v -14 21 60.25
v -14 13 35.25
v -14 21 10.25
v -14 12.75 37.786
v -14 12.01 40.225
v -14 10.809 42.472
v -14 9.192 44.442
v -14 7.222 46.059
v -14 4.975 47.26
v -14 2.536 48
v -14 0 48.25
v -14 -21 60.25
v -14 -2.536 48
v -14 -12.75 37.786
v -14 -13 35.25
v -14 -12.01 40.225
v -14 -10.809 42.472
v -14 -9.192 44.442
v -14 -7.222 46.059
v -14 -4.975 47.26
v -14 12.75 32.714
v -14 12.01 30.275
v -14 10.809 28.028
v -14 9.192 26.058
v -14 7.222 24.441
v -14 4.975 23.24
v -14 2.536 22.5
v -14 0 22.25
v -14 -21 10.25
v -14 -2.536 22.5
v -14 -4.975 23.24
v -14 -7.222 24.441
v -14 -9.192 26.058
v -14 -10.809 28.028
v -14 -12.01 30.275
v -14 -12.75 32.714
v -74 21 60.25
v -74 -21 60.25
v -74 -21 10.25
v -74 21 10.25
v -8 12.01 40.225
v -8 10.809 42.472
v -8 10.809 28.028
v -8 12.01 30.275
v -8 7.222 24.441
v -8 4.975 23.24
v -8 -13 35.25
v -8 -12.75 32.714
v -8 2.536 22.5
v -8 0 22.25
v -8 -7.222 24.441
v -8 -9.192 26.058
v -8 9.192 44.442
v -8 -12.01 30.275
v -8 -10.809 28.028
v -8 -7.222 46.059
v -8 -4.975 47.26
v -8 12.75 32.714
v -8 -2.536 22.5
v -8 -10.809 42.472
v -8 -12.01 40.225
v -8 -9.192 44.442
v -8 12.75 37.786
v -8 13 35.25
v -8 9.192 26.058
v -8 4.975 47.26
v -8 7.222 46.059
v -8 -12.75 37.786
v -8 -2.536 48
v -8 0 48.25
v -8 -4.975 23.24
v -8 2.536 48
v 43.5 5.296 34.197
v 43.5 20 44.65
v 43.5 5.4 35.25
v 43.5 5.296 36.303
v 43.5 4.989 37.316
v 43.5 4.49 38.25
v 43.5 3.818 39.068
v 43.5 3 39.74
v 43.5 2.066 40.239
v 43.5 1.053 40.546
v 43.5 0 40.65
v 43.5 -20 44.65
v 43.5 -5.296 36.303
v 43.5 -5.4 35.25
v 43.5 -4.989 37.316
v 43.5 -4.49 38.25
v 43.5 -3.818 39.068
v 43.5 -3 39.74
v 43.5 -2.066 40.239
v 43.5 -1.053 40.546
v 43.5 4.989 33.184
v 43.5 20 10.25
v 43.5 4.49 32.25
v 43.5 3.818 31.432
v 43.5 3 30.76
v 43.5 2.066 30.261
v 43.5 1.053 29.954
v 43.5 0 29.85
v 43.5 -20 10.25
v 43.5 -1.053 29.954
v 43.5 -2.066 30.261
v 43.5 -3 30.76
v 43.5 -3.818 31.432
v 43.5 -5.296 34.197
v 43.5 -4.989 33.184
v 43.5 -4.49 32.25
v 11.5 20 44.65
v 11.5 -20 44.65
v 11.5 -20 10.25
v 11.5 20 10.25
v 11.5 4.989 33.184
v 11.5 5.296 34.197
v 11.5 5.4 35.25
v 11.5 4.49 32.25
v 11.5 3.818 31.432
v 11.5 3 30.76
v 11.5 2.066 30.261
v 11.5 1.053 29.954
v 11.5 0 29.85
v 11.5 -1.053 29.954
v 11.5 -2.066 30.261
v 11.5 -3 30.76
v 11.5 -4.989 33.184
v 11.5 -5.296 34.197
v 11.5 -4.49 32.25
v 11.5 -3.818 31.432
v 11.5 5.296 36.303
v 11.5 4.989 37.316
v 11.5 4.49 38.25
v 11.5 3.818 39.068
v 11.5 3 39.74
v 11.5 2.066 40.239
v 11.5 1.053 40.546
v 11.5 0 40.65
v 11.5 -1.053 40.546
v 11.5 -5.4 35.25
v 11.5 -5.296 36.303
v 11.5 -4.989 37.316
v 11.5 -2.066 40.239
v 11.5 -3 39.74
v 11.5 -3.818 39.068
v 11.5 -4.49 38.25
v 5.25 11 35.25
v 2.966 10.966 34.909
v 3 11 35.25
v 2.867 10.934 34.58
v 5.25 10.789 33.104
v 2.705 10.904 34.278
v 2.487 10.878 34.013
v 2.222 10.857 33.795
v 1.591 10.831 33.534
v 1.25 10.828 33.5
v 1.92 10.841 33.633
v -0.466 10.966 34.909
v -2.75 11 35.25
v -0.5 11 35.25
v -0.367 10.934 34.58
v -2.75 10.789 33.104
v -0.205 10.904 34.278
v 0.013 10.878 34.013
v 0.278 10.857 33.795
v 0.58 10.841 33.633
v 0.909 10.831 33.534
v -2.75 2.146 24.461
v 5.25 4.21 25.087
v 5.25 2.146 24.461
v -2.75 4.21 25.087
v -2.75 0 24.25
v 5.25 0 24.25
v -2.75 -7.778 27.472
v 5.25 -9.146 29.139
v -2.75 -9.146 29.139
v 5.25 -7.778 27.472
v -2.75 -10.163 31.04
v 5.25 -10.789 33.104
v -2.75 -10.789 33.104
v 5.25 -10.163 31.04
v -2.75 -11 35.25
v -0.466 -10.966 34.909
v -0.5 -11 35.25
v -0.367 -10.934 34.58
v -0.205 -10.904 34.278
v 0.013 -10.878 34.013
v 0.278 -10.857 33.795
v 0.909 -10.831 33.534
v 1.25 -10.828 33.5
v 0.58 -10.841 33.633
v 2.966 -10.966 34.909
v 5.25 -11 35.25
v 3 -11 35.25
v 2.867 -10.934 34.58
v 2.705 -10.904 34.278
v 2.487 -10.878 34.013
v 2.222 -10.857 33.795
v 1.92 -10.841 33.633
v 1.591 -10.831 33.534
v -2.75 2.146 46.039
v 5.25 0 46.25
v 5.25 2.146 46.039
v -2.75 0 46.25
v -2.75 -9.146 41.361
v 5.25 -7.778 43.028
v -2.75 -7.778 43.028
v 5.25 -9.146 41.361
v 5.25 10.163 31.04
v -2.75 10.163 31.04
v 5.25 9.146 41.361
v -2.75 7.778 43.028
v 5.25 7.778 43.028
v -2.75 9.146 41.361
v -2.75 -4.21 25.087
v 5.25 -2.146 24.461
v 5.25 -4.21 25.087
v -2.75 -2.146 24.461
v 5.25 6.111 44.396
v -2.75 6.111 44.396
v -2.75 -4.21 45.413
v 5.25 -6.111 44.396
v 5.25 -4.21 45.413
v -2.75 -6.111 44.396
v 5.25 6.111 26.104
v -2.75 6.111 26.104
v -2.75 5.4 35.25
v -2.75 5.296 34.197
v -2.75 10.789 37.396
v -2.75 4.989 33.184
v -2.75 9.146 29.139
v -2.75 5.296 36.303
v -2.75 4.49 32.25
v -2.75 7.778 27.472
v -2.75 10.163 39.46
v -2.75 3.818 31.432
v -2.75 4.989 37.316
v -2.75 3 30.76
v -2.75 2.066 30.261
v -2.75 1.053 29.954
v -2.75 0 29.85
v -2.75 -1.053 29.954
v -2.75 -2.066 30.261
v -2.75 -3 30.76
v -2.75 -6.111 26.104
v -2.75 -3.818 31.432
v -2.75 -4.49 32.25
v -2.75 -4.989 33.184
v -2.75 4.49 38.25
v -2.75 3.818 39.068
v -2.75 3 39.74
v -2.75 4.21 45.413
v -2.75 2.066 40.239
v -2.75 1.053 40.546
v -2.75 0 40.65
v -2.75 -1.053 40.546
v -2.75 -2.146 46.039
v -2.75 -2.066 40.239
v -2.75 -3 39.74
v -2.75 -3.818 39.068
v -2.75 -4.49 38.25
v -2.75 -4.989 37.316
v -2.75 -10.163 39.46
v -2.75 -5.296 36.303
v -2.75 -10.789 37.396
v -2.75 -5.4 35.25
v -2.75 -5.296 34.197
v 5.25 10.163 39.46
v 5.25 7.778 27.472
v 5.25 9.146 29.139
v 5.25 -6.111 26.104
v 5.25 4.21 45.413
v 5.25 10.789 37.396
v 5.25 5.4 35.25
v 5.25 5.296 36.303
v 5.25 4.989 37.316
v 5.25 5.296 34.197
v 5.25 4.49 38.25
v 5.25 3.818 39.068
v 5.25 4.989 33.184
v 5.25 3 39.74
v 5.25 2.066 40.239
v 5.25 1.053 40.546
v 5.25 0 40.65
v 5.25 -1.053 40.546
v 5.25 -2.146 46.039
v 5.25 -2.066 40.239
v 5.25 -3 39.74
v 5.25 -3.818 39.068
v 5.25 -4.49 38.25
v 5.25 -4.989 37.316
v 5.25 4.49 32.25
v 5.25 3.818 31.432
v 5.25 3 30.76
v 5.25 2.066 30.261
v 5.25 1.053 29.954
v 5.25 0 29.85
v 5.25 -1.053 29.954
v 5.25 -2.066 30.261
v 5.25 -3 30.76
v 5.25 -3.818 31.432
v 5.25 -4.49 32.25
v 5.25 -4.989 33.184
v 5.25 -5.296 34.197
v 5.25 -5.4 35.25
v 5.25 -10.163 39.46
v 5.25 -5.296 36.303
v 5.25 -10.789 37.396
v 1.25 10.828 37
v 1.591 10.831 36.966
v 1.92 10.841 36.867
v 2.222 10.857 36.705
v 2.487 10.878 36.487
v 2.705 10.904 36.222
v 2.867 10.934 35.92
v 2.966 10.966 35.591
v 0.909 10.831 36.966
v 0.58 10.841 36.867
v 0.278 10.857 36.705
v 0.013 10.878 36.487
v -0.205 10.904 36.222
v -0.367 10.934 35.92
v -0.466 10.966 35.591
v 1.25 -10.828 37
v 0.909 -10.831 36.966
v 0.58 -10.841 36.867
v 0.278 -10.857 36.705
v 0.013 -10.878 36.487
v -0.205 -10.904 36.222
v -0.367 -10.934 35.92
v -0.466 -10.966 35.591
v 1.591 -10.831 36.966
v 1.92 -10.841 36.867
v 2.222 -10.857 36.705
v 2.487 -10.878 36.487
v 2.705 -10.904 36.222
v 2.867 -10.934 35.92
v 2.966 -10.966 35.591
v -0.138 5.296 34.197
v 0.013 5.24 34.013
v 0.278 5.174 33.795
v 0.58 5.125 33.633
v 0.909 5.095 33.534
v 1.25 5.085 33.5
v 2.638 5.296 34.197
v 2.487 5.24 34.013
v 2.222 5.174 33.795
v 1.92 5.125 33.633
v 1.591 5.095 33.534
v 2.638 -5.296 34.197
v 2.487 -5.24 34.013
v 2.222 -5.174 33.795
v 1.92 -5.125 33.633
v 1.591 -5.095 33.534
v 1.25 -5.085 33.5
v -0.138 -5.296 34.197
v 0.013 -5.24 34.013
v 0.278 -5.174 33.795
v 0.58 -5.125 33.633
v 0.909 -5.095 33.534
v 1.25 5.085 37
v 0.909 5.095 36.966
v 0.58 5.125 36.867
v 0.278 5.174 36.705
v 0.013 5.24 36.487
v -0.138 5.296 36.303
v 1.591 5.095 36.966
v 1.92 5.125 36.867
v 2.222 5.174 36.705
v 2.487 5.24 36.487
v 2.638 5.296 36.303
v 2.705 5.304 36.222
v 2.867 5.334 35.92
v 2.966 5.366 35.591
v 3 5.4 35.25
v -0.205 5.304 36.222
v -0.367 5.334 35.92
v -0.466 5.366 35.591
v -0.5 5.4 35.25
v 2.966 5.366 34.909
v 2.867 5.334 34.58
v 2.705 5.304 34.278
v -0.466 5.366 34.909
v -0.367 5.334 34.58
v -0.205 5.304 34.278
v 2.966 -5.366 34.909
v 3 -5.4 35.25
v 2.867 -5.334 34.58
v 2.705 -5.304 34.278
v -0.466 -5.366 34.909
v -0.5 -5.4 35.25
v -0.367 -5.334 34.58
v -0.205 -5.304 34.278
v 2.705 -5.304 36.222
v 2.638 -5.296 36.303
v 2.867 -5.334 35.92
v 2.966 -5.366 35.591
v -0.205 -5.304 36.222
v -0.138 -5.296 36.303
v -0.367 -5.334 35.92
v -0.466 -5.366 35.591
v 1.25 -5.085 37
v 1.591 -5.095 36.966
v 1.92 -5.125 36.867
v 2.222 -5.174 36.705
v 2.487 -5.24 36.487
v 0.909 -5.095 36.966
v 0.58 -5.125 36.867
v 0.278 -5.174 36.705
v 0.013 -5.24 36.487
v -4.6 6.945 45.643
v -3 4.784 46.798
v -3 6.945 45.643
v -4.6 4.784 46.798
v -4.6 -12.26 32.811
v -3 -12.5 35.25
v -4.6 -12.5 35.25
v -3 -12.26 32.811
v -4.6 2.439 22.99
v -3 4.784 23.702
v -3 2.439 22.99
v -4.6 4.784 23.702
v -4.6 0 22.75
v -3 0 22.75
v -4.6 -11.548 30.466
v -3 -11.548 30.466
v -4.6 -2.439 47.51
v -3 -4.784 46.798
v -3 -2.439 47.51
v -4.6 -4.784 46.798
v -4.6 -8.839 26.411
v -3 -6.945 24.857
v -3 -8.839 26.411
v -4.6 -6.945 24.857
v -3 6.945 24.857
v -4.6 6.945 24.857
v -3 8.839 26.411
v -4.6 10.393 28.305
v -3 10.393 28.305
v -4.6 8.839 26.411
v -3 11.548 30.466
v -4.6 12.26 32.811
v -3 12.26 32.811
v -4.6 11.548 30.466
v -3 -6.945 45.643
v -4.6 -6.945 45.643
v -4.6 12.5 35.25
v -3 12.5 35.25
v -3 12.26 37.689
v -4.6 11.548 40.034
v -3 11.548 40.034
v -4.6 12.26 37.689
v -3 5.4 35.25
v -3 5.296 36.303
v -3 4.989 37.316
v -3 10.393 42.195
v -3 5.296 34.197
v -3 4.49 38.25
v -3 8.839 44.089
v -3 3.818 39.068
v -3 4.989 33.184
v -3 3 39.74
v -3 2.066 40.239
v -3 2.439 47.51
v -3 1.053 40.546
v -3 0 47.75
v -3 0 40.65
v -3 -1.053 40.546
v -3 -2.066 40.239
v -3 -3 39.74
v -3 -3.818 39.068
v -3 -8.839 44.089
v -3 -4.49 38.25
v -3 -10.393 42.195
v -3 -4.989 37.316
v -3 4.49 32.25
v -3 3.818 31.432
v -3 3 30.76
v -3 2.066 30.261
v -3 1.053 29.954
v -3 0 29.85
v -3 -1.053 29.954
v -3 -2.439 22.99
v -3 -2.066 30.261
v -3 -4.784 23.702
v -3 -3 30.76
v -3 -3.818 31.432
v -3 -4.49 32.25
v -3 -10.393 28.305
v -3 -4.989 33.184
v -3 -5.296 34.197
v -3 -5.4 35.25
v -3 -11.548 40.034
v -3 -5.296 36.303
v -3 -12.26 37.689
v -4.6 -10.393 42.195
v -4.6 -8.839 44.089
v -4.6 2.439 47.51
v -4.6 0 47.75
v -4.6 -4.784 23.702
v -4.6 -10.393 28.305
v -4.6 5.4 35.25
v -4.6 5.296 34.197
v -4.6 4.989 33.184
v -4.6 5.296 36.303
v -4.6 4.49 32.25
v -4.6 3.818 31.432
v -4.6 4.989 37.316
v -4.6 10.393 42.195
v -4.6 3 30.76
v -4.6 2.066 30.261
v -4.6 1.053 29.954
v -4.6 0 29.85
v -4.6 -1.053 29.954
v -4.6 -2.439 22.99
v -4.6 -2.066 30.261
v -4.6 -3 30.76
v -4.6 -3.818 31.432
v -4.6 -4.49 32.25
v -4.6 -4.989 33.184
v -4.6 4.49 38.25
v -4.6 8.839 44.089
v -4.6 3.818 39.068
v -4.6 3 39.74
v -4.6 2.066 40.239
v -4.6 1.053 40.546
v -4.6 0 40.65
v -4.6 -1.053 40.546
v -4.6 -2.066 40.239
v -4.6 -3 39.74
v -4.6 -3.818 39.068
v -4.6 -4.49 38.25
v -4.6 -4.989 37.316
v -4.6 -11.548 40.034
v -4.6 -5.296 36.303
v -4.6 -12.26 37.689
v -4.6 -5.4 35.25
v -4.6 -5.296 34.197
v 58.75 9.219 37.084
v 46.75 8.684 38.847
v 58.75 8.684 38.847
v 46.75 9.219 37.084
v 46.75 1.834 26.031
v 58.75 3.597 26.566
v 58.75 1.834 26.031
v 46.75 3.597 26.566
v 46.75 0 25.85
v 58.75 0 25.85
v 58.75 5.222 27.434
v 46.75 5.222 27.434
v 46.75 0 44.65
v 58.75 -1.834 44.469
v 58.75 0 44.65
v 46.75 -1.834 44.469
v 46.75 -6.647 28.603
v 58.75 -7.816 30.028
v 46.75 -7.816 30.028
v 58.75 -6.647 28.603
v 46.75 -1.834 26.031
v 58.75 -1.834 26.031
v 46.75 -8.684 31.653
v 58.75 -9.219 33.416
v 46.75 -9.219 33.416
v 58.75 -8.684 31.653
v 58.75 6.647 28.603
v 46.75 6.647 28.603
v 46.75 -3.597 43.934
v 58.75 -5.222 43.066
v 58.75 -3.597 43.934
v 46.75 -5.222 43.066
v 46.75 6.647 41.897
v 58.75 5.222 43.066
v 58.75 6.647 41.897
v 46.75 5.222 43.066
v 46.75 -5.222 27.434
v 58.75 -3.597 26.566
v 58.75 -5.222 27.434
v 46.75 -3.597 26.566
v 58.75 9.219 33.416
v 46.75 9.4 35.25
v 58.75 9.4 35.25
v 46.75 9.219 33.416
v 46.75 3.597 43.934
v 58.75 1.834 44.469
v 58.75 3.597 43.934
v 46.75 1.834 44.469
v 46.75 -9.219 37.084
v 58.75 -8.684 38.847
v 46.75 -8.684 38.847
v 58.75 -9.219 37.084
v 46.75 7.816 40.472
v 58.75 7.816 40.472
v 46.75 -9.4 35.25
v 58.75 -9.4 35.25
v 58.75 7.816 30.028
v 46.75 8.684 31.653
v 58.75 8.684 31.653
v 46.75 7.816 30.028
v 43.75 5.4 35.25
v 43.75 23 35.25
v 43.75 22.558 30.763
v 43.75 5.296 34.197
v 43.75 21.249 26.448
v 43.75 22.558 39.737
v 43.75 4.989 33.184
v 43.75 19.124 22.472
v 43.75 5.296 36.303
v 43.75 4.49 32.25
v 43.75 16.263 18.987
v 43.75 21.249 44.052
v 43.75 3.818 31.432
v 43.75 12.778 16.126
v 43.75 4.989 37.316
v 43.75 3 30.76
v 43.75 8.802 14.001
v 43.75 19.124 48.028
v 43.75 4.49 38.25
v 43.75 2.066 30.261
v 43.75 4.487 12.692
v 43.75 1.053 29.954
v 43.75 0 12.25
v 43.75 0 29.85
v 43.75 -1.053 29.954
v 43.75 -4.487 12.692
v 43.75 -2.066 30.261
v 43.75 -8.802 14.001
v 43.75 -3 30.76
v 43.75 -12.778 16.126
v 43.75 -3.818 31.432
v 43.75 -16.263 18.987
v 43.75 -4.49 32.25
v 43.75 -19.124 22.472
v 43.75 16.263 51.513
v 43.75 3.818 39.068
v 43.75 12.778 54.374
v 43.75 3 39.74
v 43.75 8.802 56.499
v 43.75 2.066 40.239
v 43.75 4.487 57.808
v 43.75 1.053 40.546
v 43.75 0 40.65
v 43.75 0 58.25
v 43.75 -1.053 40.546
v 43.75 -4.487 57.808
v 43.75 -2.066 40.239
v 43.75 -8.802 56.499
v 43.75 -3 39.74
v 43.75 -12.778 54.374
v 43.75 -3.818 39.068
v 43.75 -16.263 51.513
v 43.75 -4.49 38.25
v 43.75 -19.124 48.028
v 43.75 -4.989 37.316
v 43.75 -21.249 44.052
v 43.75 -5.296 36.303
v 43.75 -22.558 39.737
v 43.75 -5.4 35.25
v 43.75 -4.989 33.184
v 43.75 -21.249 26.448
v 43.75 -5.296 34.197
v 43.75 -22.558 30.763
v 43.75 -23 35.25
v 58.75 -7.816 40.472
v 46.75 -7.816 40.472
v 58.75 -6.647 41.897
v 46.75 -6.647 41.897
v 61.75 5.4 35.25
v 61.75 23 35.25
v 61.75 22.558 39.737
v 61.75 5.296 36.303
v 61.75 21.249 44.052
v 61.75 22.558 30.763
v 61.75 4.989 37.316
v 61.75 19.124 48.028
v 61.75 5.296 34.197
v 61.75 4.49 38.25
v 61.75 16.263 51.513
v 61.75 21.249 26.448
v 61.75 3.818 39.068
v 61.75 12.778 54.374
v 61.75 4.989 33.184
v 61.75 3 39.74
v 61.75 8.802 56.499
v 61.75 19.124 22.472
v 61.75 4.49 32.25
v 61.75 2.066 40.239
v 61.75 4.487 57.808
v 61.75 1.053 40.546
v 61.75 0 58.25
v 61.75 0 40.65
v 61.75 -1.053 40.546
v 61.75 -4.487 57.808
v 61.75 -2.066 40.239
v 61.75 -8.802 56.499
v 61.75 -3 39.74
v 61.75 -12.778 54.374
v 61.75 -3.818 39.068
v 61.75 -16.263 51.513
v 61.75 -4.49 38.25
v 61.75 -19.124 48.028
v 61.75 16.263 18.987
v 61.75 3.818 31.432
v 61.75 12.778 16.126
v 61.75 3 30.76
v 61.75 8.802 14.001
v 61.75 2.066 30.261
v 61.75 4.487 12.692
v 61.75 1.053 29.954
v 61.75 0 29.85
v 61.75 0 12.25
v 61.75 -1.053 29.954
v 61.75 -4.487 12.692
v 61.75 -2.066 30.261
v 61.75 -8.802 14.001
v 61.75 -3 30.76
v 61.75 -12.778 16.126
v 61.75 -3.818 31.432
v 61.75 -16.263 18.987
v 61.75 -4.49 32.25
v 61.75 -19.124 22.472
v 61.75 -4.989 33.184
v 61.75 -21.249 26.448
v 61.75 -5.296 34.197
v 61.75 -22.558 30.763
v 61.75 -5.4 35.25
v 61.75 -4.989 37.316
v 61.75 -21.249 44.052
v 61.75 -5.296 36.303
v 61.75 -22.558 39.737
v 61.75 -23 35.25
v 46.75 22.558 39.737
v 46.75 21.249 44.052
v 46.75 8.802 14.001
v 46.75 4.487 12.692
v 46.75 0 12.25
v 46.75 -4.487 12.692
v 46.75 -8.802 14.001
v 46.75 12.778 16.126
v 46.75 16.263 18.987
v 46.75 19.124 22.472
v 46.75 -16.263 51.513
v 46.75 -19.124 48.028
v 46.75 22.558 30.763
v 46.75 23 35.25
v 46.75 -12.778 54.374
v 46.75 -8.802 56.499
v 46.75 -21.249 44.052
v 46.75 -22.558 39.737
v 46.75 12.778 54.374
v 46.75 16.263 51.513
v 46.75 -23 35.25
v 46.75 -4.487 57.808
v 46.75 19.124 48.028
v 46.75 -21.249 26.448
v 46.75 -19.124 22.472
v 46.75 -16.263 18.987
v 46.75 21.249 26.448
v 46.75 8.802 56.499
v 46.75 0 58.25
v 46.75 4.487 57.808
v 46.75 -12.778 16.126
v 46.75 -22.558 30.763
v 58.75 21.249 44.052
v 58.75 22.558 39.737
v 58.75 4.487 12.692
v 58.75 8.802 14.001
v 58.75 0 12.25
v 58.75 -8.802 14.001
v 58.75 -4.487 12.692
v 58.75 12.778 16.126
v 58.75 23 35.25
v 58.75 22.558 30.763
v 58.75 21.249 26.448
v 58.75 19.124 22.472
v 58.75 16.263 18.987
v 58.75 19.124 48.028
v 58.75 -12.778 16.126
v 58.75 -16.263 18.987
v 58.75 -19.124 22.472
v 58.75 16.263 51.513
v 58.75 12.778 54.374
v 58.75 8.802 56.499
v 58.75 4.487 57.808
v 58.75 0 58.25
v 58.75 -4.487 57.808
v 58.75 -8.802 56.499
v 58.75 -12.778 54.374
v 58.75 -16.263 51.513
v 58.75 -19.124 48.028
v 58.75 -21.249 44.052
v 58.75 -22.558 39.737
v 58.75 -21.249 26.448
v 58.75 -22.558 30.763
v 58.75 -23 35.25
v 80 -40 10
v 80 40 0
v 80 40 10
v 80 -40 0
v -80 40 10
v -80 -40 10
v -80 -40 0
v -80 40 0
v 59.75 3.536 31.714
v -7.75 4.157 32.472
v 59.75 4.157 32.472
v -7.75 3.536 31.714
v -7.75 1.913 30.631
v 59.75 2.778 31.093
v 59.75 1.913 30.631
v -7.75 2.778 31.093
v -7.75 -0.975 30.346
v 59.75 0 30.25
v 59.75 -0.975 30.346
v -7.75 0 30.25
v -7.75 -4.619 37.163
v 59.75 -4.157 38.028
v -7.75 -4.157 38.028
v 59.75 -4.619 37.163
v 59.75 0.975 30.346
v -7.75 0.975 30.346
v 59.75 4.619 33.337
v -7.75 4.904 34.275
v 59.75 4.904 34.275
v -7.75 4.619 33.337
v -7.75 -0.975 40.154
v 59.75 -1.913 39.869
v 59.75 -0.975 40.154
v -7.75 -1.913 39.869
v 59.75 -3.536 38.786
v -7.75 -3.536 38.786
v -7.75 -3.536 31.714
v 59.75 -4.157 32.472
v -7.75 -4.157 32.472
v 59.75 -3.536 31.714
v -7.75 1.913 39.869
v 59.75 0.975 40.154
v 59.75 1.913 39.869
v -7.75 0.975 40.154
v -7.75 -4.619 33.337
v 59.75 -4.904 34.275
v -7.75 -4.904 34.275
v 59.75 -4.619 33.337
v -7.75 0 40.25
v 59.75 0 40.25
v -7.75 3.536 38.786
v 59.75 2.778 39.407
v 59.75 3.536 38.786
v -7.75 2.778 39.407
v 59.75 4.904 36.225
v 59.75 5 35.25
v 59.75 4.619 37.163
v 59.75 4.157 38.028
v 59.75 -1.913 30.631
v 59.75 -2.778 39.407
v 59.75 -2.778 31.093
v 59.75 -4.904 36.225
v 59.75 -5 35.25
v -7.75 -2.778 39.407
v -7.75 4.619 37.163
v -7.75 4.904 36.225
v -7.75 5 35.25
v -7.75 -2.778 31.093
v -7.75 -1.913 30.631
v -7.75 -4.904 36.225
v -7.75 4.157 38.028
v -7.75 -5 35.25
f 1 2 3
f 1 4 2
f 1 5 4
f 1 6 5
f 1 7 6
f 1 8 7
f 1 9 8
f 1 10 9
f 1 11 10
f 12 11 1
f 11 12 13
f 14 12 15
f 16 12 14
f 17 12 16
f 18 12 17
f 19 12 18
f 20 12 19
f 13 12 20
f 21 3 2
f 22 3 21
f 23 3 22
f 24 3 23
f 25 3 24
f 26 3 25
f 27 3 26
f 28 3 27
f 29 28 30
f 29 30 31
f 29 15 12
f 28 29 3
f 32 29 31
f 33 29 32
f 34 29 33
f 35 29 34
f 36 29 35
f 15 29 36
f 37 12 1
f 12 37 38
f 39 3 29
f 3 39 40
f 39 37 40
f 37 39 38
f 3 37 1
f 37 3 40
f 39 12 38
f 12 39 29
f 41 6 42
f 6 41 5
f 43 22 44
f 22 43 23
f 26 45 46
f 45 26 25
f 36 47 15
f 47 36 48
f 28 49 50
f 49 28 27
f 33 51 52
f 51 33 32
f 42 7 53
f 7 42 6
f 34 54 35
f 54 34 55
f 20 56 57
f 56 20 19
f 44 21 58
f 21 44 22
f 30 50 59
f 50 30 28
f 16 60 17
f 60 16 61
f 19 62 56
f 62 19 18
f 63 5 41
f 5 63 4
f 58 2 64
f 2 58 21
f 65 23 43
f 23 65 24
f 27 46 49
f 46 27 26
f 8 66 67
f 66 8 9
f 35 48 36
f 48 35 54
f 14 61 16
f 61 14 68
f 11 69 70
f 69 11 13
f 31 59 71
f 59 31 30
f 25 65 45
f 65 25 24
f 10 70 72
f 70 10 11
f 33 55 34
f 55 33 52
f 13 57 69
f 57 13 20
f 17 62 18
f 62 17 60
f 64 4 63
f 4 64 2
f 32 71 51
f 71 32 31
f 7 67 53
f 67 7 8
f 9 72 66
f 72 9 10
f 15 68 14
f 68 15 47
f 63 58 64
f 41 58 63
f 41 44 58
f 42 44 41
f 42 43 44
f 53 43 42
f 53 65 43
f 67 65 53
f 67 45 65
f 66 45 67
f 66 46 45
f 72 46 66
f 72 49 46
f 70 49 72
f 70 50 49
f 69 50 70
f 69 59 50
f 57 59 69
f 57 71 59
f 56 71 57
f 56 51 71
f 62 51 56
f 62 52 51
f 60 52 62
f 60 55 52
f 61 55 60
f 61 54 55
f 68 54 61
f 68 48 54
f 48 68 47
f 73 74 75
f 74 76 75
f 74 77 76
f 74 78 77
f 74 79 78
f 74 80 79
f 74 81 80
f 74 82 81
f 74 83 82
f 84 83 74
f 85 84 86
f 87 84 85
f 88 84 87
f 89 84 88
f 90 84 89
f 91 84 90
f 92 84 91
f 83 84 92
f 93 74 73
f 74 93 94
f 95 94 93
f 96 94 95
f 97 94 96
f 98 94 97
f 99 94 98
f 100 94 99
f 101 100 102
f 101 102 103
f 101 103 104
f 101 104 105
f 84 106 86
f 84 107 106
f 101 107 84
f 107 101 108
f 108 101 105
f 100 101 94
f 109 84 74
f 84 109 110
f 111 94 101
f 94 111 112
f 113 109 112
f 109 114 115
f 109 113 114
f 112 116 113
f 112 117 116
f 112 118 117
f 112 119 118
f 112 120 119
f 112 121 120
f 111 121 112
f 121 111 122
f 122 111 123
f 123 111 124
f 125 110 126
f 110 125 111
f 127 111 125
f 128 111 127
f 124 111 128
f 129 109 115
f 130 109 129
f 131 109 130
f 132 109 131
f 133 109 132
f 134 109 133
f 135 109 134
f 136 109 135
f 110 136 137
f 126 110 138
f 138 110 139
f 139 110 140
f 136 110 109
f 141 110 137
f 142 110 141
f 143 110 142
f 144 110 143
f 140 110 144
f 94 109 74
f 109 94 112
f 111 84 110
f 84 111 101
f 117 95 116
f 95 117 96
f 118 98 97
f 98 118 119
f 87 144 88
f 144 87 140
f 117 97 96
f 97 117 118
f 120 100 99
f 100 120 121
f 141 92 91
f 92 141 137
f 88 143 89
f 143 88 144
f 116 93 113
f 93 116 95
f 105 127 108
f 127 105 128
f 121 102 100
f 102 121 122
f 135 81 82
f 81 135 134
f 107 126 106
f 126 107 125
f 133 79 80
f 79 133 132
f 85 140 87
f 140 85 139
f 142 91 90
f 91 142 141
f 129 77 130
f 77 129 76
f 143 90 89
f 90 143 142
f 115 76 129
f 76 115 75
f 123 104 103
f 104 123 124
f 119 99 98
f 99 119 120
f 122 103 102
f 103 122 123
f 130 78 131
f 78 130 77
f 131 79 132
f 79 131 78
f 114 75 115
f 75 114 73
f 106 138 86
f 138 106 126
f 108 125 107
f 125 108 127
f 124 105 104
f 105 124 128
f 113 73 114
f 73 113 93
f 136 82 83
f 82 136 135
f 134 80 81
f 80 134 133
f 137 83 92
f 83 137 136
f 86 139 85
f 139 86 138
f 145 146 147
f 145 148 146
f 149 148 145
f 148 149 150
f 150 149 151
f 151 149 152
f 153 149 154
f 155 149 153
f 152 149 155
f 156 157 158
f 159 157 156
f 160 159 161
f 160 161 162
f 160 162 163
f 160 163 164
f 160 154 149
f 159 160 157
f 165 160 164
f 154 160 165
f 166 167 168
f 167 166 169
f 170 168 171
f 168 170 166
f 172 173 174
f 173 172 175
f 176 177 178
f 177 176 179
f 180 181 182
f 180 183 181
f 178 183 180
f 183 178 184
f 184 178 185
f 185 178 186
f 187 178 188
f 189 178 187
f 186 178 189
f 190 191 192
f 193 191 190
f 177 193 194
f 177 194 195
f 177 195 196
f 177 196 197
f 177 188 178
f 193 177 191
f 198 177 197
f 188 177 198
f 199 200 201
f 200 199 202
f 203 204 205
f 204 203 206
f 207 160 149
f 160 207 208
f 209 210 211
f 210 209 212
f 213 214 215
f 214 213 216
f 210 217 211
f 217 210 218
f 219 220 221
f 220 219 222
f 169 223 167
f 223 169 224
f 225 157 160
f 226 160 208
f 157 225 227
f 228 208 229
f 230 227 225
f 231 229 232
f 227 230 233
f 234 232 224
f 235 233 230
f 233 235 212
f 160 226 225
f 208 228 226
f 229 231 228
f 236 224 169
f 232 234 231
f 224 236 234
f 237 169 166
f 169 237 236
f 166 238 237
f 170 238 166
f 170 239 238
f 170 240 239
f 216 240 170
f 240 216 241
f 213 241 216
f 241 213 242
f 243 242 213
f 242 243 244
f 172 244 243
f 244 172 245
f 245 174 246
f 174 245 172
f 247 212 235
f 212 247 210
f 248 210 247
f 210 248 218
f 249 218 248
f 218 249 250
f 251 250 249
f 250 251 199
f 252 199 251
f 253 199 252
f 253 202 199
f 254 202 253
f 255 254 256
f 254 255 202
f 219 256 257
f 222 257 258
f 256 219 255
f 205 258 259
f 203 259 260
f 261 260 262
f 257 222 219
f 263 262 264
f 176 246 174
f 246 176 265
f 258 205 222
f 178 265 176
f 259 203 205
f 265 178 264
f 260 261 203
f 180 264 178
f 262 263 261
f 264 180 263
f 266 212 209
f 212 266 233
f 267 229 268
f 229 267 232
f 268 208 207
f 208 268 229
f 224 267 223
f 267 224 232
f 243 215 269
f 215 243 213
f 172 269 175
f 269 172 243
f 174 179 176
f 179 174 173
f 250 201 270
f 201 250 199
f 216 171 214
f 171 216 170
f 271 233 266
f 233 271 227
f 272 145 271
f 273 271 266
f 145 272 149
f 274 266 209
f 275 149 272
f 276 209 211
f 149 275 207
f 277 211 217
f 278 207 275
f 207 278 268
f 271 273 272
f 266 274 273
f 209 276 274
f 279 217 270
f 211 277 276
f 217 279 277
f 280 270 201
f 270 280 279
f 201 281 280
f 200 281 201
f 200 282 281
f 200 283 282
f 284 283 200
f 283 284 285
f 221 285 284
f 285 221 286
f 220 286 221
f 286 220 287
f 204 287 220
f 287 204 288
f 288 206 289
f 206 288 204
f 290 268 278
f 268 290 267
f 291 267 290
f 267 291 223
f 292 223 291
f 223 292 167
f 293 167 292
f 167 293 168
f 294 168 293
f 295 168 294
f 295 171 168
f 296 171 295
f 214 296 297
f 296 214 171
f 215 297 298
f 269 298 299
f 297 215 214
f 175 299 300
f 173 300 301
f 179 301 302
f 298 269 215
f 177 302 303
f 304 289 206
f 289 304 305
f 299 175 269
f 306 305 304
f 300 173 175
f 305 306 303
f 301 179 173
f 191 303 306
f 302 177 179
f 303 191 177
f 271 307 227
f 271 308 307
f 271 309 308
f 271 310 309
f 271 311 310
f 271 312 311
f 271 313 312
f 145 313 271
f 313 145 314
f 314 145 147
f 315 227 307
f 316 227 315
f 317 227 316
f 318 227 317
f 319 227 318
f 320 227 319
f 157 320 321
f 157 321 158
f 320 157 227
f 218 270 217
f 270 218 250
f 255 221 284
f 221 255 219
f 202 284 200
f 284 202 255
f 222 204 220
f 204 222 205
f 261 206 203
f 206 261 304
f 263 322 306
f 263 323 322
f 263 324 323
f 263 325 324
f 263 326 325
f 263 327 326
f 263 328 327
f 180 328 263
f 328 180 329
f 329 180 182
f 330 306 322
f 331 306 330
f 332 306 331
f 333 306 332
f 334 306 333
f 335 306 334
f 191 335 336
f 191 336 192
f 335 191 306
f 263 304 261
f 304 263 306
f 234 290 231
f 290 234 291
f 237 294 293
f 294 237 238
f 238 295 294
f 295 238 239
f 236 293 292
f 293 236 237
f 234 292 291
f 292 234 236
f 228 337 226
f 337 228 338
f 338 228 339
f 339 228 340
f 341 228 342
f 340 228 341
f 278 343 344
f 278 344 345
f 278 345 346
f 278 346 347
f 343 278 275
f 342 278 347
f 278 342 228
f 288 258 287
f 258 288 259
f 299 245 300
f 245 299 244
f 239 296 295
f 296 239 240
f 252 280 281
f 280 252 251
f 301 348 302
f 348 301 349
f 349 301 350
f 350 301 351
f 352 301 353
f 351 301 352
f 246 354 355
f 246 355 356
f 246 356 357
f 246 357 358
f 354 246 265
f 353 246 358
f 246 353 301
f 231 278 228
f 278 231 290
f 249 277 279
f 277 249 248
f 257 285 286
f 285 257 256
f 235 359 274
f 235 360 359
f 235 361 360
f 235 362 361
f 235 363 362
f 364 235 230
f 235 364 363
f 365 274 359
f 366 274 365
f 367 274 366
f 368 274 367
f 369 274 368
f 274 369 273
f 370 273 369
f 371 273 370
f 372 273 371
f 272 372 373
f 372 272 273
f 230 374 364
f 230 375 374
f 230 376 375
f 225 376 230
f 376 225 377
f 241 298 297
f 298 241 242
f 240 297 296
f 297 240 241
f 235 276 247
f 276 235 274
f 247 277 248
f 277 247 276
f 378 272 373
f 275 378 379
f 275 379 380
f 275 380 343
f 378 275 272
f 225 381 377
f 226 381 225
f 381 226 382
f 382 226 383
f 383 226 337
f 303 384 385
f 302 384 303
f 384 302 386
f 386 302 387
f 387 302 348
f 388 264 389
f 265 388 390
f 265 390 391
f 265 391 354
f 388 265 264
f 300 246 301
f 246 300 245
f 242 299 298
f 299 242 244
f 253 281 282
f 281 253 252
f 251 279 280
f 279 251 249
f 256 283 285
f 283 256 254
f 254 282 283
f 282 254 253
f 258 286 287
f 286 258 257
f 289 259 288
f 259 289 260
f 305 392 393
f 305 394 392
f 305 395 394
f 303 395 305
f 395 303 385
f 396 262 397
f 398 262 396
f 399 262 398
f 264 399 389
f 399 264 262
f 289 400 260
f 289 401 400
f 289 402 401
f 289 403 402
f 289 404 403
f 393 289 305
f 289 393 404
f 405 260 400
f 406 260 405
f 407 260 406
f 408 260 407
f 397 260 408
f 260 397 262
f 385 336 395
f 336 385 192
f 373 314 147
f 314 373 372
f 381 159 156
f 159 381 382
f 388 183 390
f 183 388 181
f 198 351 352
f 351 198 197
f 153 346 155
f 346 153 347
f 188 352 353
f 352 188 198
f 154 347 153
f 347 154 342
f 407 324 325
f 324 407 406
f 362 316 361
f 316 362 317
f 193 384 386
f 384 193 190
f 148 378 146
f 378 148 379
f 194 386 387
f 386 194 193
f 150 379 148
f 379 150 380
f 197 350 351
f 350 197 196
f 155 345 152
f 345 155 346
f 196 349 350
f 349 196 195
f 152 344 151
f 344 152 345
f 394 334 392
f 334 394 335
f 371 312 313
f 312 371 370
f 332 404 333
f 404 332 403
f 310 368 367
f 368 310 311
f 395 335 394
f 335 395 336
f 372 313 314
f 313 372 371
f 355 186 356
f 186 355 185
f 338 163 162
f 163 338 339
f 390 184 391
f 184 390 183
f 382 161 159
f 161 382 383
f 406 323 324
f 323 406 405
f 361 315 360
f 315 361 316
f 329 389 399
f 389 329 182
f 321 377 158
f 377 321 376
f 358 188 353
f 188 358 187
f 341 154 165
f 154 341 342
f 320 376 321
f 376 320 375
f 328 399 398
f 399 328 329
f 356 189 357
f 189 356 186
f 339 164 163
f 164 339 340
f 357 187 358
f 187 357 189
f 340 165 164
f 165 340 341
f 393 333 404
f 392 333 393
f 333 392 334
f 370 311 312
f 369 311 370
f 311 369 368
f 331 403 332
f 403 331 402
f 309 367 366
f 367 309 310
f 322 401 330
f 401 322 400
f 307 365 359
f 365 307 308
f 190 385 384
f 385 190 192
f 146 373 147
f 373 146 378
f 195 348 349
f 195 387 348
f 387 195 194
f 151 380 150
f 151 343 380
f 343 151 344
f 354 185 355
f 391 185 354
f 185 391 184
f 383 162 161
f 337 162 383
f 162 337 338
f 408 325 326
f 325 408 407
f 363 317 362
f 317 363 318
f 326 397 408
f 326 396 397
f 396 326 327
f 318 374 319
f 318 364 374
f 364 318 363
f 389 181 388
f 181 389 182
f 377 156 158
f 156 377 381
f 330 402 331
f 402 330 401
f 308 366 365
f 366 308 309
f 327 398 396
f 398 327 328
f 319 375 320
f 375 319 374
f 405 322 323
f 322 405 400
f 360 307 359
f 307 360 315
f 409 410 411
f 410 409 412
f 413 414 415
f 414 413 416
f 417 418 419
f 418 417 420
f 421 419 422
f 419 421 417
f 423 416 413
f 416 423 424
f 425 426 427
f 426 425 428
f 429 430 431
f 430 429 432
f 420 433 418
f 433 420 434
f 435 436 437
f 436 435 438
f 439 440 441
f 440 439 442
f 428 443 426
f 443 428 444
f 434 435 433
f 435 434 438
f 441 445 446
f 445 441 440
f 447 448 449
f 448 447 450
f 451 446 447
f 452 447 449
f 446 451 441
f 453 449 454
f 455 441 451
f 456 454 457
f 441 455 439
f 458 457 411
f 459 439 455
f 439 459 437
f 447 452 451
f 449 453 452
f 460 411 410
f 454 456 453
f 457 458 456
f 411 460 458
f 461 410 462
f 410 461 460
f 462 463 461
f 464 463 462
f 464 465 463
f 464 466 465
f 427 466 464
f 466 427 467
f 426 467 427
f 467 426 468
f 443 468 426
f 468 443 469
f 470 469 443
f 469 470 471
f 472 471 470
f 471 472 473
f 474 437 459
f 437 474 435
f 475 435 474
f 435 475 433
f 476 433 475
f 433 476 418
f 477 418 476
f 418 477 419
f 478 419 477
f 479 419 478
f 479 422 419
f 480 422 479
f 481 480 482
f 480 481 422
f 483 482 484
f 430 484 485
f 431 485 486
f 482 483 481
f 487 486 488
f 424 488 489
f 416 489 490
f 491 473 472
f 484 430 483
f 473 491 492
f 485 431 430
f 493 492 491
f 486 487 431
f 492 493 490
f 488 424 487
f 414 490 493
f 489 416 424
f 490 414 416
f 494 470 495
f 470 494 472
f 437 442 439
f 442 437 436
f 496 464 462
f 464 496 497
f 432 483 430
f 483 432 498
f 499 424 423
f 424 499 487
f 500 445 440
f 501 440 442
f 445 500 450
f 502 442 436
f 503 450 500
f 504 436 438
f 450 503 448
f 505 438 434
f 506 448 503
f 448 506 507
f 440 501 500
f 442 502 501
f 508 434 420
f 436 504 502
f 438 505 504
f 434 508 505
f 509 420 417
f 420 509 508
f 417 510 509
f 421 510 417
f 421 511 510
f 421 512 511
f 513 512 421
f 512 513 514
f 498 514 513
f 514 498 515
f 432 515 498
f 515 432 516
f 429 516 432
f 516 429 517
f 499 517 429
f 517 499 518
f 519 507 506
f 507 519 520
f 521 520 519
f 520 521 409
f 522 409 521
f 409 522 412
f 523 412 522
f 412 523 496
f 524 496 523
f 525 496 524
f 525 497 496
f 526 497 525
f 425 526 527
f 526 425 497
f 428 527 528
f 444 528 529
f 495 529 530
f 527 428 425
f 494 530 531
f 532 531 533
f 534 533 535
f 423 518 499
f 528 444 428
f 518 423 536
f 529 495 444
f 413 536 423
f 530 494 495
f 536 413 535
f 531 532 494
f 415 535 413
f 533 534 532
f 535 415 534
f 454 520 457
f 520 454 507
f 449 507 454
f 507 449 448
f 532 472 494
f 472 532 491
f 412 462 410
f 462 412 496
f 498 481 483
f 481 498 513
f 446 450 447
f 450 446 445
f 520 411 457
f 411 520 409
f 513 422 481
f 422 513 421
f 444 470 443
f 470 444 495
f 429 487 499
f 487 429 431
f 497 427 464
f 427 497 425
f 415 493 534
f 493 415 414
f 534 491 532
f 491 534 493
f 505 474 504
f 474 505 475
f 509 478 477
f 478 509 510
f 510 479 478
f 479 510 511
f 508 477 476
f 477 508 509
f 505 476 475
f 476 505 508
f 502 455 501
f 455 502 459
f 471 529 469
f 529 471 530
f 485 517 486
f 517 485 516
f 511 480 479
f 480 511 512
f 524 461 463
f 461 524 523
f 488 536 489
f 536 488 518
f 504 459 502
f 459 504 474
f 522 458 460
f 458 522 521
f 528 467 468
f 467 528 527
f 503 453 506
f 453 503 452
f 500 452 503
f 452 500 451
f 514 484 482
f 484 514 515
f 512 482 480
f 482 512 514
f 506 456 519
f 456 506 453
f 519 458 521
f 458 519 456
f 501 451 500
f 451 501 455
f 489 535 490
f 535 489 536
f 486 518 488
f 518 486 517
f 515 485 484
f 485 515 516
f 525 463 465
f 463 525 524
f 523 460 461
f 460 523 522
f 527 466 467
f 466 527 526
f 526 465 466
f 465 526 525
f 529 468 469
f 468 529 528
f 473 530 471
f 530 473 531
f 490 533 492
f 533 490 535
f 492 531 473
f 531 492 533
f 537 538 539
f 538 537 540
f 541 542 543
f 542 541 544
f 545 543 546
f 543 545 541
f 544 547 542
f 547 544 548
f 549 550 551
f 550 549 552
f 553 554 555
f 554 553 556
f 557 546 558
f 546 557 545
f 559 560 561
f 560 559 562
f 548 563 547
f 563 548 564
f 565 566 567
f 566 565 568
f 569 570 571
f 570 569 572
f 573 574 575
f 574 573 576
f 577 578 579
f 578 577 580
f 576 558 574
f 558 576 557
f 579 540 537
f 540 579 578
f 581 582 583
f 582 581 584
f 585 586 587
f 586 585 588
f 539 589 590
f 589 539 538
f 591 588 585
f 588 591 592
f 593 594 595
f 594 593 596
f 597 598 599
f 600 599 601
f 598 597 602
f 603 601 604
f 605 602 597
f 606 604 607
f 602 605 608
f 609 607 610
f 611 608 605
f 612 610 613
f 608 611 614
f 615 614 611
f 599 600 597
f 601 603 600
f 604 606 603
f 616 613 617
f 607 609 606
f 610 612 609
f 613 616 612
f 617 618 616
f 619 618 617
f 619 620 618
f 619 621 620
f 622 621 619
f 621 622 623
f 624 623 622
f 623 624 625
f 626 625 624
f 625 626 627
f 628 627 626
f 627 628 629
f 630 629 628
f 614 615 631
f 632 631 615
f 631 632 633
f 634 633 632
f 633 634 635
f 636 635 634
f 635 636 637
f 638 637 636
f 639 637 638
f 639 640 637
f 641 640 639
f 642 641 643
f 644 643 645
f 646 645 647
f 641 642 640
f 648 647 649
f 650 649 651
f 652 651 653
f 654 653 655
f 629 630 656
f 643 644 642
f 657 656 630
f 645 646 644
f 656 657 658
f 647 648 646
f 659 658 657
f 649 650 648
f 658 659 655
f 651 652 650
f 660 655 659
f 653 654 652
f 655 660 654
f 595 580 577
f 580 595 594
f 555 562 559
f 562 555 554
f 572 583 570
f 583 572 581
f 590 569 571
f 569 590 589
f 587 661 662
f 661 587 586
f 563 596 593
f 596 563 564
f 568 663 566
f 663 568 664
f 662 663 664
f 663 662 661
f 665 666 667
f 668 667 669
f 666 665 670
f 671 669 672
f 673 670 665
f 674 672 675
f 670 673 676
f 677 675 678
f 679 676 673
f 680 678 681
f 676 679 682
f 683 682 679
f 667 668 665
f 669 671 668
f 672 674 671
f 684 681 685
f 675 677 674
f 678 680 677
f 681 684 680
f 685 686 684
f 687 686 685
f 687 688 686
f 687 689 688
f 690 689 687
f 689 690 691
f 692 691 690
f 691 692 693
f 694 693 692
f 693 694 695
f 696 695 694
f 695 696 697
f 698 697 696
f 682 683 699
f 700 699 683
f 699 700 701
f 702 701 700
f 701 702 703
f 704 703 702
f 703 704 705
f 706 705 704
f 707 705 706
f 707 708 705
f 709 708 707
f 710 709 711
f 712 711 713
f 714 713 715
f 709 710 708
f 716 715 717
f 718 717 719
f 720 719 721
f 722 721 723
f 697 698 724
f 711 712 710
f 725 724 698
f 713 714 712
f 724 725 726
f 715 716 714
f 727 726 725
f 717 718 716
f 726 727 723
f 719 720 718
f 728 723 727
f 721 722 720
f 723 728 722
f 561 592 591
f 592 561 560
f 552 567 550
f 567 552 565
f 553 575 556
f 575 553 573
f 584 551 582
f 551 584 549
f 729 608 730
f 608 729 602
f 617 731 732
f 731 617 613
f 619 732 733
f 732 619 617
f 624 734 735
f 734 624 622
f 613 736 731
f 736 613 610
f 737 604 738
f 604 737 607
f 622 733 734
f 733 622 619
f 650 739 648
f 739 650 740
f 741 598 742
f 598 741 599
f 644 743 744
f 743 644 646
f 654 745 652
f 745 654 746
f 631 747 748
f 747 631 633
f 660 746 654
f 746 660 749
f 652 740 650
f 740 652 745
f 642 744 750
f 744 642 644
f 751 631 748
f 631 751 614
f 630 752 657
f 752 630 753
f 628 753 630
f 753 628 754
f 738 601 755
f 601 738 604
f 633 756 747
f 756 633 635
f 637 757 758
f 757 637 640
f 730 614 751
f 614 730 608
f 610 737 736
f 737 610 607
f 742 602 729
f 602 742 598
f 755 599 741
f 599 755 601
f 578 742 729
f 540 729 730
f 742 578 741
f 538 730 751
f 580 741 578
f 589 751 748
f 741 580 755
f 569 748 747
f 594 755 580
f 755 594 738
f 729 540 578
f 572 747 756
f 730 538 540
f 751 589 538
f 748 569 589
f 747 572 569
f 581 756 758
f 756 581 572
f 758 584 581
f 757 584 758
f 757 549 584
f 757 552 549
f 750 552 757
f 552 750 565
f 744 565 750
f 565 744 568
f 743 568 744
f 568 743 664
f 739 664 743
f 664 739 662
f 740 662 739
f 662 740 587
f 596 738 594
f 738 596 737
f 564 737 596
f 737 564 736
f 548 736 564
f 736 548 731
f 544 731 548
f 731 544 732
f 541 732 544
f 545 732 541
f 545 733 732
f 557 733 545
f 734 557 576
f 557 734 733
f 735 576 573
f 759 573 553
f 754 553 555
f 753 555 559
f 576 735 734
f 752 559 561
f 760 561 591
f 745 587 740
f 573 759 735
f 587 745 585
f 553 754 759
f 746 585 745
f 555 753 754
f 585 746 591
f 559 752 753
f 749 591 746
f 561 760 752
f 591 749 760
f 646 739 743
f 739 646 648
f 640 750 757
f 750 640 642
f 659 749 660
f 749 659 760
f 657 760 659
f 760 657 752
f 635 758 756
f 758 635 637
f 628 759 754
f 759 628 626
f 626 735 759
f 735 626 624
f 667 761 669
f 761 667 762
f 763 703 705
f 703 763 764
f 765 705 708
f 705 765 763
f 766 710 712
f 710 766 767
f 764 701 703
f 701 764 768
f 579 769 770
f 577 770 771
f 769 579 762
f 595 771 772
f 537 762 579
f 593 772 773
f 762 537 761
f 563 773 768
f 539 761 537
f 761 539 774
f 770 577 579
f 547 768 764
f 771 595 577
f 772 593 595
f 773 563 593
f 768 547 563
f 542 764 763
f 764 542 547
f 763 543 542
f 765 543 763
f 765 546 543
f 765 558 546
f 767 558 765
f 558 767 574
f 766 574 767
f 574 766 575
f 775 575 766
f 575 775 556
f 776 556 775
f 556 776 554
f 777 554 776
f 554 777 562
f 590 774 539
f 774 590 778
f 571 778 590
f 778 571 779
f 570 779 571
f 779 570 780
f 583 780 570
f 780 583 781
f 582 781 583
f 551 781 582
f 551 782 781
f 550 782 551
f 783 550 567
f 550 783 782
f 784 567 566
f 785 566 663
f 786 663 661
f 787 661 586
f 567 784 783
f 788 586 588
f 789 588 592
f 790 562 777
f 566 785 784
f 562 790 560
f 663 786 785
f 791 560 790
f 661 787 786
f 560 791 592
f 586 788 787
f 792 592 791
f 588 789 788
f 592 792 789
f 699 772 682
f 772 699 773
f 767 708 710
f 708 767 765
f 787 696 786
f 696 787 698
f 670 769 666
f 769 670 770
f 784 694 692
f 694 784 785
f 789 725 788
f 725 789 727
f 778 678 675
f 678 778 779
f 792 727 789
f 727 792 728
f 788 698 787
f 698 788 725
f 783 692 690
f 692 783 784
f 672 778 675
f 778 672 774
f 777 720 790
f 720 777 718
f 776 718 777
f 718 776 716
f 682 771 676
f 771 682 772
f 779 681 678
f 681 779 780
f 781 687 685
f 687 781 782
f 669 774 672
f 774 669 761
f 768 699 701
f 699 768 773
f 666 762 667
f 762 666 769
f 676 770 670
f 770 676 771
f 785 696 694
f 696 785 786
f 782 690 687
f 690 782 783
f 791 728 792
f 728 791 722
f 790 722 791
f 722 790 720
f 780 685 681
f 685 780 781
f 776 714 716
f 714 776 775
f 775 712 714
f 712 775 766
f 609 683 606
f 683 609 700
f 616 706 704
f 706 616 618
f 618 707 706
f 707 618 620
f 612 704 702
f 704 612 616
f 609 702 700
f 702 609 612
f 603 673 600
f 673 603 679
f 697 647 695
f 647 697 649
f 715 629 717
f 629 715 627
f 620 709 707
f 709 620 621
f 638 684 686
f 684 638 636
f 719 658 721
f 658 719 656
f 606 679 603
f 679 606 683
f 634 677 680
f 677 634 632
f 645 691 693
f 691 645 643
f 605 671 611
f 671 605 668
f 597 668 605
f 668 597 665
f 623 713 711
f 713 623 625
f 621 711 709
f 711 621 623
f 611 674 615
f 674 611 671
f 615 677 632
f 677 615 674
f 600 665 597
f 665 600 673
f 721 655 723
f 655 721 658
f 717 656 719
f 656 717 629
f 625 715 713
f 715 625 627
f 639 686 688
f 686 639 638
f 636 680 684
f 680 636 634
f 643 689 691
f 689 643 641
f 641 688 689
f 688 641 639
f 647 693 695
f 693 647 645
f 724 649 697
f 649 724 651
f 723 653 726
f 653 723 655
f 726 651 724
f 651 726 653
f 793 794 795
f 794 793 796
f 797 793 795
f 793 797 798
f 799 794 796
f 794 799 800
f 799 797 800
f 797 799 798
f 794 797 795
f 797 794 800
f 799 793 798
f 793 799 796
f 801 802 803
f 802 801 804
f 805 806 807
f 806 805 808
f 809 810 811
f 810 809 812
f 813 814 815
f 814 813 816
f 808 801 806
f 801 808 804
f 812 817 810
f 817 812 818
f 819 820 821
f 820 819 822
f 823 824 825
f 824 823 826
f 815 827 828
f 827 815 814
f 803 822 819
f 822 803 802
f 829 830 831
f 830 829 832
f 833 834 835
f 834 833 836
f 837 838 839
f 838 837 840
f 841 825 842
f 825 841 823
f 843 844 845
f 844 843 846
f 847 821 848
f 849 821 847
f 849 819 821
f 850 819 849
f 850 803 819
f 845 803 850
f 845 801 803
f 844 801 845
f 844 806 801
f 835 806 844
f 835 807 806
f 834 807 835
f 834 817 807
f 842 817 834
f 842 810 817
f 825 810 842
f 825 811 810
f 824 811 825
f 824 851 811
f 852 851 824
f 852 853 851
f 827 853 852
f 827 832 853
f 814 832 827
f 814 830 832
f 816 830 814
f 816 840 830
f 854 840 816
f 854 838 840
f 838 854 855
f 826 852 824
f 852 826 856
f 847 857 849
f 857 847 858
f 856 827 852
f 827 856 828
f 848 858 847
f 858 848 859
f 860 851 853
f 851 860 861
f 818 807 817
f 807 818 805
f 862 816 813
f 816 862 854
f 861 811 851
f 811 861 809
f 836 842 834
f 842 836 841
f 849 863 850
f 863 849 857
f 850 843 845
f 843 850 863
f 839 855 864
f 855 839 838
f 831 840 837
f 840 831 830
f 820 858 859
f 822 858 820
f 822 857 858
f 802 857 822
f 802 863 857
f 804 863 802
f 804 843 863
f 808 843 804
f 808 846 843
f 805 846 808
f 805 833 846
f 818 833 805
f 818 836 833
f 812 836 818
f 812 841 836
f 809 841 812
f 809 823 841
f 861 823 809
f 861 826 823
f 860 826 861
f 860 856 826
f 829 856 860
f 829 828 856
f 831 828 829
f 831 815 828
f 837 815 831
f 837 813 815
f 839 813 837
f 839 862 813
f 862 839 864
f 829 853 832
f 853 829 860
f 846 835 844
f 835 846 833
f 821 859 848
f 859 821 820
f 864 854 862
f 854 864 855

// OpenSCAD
$fn = 32;

// ------------------------------------------------------------------------
// Motor drive station: motor 60 x 50 mm, shaft d10, pulley d46
// Every part is its own module, assembly() places every instance.
// ------------------------------------------------------------------------

// --- part 1 ---
module station_bed() {
  difference() {
    translate([-80, -40, 0]) cube([160, 80, 10]);
  }
}

// --- part 2 ---
module drive_motor() {
  union() {
    translate([-30, -21, 0]) cube([60, 42, 50]);
    translate([33, 0, 25]) rotate([0, 90, 0]) cylinder(h = 6, d = 26, center = true);
  }
}

// --- part 3 ---
module pillow_block() {
  difference() {
    translate([-16, -20, 0]) cube([32, 40, 34.4]);
    translate([0, 0, 25]) rotate([0, 90, 0]) cylinder(h = 34, d = 10.8, center = true);
  }
}

// --- part 4 ---
module drive_shaft() {
  translate([0, 0, -33.75]) cylinder(h = 67.5, d = 10);
}

// --- part 5 ---
module shaft_collar() {
  difference() {
    cylinder(h = 8, d = 22);
    translate([0, 0, -1]) cylinder(h = 10, d = 10.8);
    translate([0, 0, 4]) rotate([90, 0, 0]) cylinder(h = 24, d = 3.5, center = true);
  }
}

// --- part 6 ---
module collar_washer() {
  difference() {
      translate([0, 0, 0]) cylinder(h = 1.6, d = 25);
      translate([0, 0, -1]) cylinder(h = 3.6, d = 10.8);
    }
}

// --- part 7 ---
module drive_pulley() {
  difference() {
    union() {
      cylinder(h = 18, d = 18.8);
      cylinder(h = 3, d = 46);
      translate([0, 0, 15]) cylinder(h = 3, d = 46);
    }
    translate([0, 0, -1]) cylinder(h = 20, d = 10.8);
  }
}

// --- assembly ---
module assembly() {
  color([0.80, 0.24, 0.20]) translate([0, 0, 0]) rotate([0, 0, 0]) station_bed();
  color([0.20, 0.45, 0.75]) translate([-44, 0, 10.25]) rotate([0, 0, 0]) drive_motor();
  color([0.25, 0.62, 0.32]) translate([27.5, 0, 10.25]) rotate([0, 0, 0]) pillow_block();
  color([0.92, 0.70, 0.18]) translate([26, 0, 35.25]) rotate([0, 90, 0]) drive_shaft();
  color([0.58, 0.35, 0.70]) translate([-2.75, 0, 35.25]) rotate([0, 90, 0]) shaft_collar();
  color([0.16, 0.66, 0.66]) translate([-4.6, 0, 35.25]) rotate([0, 90, 0]) collar_washer();
  color([0.85, 0.48, 0.18]) translate([43.75, 0, 35.25]) rotate([0, 90, 0]) drive_pulley();
}

assembly();
